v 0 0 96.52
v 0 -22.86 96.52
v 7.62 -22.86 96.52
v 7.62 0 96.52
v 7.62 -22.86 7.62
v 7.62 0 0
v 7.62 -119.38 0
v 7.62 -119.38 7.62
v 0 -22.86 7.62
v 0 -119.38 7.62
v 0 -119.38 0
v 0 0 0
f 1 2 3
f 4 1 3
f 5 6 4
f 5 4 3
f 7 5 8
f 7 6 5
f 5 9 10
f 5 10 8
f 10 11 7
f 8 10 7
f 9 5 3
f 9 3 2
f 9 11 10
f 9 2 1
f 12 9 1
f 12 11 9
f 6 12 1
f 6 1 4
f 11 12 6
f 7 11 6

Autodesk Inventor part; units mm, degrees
ref_plane "YZ Plane" through (0, 0, 0) normal (1, 0, 0) x (0, 1, 0)
ref_plane "XZ Plane" through (0, 0, 0) normal (0, 1, 0) x (-1, 0, 0)
ref_plane "XY Plane" through (0, 0, 0) normal (0, 0, 1) x (1, 0, 0)
sketch "Sketch1" plane through (0, 0, 0) normal (0, 0, 1) x (1, 0, 0)
  line L0 (0, 0) -> (7.62, 0)
  line L1 (7.62, 0) -> (7.62, -22.86)
  line L2 (7.62, -22.86) -> (0, -22.86)
  line L3 (0, -22.86) -> (0, 0)
  line L4 (7.62, -22.86) -> (0, -22.86)
  line L5 (0, -22.86) -> (0, -119.38)
  line L6 (0, -119.38) -> (7.62, -119.38)
  line L7 (7.62, -119.38) -> (7.62, -22.86)
  line L8 (0, -111.76) -> (0, -119.38)
  line L9 (0, 0) -> (7.62, 0)
  line L10 (7.62, 0) -> (7.62, -22.86)
  line L11 (7.62, -22.86) -> (0, -22.86)
  line L12 (0, -22.86) -> (0, 0)
  line L13 (7.62, -119.38) -> (35.0744, -119.38)
  line L14 (35.0744, -119.38) -> (69.9139, -119.38)
  line L15 (69.9139, -111.76) -> (69.9139, -119.38)
  line L16 (69.9139, -111.76) -> (7.62, -111.76)
  point P0 (0, -22.86)
  dimension "d0" = 7.62
  dimension "d1" = 22.86
  dimension "d2" = 7.62
  dimension "d3" = 96.52
  dimension "d6" = 7.62
extrude "Extrusion1" add sketch "Sketch1" along normal blind 7.62 contours L0 L1 L2 L3 | L2 L7 L6 L5
extrude "Extrusion2" add sketch "Sketch1" along normal blind 96.52 contours L0 L1 L2 L3
sketch "Sketch2" plane through (0, -119.38, 0) normal (-1, 0, 0) x (0, 0, 1)
  line L0 (0, 0) -> (7.62, 0) projected
  line L1 (7.62, 0) -> (63.8725, 0)
  line L2 (63.8725, 0) -> (63.8725, 11.8579)
  line L3 (63.8725, 11.8579) -> (7.62, 11.8579)
  point P0 (0, 119.38)
equation "\"d0\" = d6"
properties part number "e"
